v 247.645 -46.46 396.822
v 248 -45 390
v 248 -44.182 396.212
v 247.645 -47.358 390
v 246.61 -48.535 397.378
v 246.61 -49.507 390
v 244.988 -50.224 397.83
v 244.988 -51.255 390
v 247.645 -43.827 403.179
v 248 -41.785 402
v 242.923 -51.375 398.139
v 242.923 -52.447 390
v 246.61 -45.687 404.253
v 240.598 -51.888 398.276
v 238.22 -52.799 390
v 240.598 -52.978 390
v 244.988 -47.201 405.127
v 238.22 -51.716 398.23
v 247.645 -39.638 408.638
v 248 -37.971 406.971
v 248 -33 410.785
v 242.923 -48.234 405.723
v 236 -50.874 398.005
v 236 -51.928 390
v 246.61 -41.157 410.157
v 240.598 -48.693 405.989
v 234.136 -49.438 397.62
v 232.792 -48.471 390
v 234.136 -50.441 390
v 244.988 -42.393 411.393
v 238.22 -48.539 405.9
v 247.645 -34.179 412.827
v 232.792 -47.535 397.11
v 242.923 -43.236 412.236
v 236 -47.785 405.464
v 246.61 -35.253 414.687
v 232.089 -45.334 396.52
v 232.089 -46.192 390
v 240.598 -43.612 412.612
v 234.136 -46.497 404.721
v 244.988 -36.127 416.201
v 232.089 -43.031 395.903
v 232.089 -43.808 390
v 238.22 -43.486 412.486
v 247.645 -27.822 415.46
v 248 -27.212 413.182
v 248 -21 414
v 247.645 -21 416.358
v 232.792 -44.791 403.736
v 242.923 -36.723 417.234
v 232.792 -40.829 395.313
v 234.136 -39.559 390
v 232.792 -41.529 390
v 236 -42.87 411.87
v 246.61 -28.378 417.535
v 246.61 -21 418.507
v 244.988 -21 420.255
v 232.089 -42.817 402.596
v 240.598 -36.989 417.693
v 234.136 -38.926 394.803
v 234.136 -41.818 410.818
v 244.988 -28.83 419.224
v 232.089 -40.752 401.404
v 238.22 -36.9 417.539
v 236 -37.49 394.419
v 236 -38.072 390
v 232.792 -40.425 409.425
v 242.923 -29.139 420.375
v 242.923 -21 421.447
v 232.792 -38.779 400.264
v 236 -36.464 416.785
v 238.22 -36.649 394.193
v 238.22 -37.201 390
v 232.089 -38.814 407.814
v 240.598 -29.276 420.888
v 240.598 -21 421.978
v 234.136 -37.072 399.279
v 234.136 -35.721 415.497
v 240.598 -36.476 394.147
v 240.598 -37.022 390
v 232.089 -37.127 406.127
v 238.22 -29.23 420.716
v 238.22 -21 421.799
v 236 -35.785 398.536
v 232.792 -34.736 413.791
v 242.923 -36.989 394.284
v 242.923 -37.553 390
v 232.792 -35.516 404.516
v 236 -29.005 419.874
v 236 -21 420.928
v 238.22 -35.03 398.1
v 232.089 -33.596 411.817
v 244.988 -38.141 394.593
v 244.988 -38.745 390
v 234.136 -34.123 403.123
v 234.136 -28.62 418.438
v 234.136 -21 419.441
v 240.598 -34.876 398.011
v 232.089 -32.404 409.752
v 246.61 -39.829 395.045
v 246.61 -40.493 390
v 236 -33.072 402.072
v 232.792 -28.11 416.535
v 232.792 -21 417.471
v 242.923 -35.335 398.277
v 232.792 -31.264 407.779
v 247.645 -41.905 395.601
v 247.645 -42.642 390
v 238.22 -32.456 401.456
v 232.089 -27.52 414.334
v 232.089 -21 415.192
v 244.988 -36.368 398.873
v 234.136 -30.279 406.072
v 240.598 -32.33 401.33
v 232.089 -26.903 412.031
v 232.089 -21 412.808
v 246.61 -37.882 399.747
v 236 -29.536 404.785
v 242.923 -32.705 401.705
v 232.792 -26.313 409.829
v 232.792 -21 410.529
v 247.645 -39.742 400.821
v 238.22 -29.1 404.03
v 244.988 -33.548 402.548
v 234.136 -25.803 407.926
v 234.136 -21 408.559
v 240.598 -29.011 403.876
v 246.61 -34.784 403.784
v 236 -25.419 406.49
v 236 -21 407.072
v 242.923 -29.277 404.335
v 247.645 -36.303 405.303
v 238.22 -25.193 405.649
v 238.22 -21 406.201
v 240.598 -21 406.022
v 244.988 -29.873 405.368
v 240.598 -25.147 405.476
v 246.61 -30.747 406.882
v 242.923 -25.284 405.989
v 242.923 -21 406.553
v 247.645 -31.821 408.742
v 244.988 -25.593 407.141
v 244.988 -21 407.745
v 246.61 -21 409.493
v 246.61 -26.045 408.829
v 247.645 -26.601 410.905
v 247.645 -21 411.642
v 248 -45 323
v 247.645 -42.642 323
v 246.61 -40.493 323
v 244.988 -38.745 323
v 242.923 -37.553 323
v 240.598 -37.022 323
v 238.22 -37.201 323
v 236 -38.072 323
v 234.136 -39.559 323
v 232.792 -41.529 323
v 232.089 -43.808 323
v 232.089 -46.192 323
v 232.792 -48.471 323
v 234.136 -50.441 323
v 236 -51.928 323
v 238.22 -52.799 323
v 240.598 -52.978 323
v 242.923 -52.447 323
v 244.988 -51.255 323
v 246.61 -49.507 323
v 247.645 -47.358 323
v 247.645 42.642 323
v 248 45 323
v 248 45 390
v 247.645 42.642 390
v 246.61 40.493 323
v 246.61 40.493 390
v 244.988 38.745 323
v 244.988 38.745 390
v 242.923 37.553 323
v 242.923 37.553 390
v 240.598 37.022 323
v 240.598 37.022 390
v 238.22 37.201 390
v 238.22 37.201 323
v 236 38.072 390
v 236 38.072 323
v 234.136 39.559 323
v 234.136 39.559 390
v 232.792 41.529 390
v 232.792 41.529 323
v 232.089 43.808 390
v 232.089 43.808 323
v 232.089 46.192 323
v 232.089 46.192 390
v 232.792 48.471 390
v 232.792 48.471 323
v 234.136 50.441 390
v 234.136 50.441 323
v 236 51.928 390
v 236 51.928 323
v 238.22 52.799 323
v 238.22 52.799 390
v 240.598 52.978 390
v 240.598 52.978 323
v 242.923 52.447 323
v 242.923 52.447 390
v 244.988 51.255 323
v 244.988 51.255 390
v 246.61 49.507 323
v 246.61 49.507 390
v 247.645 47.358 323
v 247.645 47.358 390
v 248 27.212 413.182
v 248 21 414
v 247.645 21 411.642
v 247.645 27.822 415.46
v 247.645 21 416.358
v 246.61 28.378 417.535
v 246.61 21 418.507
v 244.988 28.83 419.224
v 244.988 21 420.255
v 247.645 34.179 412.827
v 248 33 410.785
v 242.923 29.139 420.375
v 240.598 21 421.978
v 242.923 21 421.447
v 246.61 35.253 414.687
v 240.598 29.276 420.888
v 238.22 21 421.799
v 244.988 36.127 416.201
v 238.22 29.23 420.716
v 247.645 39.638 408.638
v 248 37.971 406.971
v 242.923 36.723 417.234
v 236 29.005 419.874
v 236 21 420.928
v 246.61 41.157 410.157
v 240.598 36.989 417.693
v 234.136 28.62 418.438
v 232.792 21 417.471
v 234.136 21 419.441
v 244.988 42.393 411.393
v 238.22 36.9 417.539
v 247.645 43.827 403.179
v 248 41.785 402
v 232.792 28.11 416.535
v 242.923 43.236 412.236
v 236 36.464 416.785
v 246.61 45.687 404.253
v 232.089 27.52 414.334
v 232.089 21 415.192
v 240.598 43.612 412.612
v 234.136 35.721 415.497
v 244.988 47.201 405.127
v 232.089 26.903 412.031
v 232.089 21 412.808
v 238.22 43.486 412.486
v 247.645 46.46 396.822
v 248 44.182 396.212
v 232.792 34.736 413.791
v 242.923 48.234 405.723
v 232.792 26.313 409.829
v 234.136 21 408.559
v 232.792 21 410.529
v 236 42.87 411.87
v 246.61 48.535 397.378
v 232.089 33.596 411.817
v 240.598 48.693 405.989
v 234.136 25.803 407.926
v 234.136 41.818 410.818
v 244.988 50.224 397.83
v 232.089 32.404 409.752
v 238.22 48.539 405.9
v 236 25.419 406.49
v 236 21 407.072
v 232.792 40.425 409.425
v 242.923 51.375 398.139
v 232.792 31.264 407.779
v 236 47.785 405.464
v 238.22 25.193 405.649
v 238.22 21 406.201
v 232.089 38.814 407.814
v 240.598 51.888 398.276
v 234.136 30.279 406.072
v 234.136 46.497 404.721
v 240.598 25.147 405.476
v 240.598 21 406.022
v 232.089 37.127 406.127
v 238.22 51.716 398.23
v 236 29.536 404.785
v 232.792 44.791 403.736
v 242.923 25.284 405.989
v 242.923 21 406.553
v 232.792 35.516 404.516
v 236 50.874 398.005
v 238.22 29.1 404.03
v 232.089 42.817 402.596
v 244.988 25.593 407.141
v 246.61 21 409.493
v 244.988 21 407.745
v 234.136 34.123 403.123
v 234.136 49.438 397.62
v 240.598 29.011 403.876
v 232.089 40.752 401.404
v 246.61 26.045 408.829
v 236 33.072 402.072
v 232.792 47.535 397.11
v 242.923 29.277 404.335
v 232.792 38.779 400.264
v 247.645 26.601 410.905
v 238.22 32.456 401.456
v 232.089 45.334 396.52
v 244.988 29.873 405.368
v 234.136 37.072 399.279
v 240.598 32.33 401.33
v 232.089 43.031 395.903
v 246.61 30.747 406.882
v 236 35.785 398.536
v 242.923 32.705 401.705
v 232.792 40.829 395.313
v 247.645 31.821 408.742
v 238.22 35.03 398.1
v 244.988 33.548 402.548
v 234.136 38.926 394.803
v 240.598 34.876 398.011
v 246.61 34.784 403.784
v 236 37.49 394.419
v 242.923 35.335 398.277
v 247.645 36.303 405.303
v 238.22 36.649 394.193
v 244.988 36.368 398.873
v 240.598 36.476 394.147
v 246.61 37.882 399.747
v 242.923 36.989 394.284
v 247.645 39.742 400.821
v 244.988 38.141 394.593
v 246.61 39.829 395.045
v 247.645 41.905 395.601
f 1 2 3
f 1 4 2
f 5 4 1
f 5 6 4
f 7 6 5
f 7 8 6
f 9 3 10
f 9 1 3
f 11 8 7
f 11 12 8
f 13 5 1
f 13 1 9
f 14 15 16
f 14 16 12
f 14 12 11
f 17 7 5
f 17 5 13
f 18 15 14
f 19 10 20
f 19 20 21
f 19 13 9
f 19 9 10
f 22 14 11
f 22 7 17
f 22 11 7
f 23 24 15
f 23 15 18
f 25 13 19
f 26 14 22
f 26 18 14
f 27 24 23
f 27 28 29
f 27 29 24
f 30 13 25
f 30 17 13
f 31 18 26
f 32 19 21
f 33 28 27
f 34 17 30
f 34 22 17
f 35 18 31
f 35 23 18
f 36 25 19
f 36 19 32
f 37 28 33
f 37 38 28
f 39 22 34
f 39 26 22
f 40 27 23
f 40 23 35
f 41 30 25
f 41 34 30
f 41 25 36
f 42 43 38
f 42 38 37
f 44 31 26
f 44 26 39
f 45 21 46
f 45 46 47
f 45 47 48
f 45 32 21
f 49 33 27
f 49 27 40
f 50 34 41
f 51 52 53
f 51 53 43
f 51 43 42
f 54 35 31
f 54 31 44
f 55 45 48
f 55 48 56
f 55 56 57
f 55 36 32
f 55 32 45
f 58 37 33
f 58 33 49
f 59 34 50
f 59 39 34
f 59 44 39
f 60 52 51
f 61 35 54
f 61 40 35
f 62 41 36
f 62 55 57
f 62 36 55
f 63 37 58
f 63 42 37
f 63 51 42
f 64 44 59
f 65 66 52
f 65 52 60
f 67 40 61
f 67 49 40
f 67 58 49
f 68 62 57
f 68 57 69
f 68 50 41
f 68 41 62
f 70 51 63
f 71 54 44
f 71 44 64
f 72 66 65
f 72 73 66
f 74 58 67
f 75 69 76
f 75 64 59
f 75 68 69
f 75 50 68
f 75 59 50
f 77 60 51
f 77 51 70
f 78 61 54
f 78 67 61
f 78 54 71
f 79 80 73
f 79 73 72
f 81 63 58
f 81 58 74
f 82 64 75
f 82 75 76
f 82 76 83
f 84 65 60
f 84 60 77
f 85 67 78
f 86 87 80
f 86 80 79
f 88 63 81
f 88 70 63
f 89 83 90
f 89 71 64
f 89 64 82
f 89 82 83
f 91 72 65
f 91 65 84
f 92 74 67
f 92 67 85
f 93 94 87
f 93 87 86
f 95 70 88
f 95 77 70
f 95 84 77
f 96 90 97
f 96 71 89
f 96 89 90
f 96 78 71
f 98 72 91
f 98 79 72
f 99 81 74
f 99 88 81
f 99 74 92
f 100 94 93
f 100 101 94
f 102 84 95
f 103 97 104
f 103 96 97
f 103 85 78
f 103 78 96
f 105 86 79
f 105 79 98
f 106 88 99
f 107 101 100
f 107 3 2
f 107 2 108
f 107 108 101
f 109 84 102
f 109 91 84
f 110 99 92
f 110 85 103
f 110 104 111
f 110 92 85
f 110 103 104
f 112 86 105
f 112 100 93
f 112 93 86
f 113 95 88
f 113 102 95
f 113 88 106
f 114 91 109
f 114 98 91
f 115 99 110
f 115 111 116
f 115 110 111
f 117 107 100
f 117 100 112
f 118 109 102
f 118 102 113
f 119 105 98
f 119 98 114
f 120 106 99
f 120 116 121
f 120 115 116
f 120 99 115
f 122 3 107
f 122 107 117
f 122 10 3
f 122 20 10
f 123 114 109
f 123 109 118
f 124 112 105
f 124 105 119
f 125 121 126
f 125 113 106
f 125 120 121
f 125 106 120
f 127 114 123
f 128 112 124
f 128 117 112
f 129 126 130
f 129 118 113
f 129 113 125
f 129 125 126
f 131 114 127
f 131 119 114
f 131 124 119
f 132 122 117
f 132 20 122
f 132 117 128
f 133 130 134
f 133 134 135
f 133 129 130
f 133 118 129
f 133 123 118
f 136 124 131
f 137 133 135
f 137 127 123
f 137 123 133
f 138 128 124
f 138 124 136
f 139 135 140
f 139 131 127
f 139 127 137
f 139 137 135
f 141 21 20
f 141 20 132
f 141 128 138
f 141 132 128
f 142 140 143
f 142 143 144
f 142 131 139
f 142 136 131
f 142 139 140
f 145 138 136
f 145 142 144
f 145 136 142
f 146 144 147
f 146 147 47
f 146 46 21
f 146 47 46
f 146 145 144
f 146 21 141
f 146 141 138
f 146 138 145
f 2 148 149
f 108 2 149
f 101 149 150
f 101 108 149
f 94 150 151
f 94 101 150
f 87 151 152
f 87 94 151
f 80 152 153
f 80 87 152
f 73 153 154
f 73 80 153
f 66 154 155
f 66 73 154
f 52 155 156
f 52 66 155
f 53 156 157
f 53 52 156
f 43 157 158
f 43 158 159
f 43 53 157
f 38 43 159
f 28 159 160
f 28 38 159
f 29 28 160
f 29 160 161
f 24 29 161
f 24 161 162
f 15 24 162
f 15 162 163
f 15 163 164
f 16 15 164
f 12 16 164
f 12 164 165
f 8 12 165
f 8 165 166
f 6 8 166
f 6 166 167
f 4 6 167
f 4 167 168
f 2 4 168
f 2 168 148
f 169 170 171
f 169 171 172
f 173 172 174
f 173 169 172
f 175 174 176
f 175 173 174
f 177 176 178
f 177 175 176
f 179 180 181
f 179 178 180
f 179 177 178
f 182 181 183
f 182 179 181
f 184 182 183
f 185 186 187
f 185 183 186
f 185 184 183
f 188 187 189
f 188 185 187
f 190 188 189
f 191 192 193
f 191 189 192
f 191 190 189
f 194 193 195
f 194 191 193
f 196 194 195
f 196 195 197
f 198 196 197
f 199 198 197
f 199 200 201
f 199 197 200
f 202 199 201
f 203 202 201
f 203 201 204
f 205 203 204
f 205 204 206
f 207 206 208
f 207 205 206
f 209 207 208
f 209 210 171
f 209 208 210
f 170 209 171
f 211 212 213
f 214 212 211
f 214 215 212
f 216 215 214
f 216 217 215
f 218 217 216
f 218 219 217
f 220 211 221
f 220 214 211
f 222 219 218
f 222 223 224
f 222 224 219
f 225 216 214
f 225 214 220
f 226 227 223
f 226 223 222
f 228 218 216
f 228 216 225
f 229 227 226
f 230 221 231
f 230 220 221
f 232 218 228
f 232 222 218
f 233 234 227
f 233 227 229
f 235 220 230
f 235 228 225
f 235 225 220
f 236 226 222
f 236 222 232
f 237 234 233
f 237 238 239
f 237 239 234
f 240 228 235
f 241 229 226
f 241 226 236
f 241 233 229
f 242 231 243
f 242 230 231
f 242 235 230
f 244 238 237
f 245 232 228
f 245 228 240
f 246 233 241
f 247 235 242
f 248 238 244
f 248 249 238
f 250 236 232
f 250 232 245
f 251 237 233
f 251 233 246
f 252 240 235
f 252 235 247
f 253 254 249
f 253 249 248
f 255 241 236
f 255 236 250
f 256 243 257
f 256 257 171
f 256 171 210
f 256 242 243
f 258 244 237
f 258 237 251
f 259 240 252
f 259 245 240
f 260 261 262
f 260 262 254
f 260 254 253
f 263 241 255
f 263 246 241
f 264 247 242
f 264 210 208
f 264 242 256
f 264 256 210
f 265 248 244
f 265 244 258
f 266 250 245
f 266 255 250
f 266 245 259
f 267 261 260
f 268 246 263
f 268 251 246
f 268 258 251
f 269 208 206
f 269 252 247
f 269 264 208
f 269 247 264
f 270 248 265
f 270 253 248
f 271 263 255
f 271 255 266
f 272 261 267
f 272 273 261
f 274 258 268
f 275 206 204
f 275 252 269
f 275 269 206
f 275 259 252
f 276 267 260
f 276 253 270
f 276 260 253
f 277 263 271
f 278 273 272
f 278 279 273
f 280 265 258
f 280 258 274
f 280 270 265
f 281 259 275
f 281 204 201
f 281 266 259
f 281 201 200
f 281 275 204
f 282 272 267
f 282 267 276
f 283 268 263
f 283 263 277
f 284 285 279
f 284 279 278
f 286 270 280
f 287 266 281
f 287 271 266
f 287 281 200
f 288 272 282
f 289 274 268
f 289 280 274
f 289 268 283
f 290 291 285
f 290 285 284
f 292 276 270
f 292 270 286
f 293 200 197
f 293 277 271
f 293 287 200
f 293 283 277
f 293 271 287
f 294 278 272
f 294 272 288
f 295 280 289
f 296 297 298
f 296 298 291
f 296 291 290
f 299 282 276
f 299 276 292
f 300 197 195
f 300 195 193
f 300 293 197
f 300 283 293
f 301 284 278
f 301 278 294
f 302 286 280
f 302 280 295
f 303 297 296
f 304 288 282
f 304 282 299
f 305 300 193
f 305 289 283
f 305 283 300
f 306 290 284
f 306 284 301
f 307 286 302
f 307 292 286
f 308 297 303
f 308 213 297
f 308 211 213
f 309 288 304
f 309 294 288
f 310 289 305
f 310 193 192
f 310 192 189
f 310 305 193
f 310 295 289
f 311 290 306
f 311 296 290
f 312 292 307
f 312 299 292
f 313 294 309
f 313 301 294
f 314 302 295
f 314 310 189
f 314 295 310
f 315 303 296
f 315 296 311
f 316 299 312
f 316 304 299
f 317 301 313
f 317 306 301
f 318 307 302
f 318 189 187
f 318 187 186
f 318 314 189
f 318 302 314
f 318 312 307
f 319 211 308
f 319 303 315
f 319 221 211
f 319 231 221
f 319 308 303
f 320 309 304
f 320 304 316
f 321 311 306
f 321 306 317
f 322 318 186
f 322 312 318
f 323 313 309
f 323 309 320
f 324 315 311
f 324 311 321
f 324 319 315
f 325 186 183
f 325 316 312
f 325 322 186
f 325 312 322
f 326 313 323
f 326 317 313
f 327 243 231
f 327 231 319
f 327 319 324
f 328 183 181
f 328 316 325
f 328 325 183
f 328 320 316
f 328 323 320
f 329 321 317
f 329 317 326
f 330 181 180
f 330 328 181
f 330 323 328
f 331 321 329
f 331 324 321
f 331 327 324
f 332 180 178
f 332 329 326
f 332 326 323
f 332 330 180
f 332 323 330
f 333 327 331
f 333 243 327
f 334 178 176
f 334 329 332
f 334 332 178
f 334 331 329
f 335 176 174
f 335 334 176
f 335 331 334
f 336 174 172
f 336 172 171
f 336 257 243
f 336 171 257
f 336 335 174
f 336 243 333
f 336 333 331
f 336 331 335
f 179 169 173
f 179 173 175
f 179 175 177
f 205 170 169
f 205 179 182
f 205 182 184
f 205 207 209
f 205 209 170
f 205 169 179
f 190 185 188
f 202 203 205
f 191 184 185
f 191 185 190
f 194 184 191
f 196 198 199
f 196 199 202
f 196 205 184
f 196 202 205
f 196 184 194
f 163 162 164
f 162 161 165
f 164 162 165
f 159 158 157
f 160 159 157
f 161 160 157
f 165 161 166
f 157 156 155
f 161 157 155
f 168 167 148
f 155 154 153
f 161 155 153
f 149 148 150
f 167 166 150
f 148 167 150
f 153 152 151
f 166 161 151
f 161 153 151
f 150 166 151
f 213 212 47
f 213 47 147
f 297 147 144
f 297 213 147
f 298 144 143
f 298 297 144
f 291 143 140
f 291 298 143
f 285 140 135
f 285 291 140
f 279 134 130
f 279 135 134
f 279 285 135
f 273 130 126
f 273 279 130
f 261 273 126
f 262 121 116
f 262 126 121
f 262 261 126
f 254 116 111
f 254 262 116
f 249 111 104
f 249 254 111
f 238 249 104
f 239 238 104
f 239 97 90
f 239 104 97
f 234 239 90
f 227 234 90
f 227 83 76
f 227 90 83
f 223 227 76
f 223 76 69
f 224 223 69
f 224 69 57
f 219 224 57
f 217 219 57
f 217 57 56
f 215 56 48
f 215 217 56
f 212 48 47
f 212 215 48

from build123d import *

# Parameters (mm, degrees)
PIPE_1_PROFILE_R = 8


with BuildPart() as part:
    # Pipe 1: sweep along a curve in space
    with BuildLine() as pipe_1_path:
        Line((240, -45, 323), (240, -45, 390))
        ThreePointArc((240, -45, 390), (240, -37.970562748, 406.970562748), (240, -21, 414))
        Line((240, -21, 414), (240, 21, 414))
        ThreePointArc((240, 21, 414), (240, 37.970562748, 406.970562748), (240, 45, 390))
        Line((240, 45, 390), (240, 45, 323))
    # Pipe 1 profile (on start of the path) → Pipe 1 (sweep)
    with BuildSketch(Plane(origin=(240, -45, 323), x_dir=(1, 0, 0), z_dir=(0, 0, 1))):
        Circle(PIPE_1_PROFILE_R)
    sweep(path=pipe_1_path.line)


solid = part.part
